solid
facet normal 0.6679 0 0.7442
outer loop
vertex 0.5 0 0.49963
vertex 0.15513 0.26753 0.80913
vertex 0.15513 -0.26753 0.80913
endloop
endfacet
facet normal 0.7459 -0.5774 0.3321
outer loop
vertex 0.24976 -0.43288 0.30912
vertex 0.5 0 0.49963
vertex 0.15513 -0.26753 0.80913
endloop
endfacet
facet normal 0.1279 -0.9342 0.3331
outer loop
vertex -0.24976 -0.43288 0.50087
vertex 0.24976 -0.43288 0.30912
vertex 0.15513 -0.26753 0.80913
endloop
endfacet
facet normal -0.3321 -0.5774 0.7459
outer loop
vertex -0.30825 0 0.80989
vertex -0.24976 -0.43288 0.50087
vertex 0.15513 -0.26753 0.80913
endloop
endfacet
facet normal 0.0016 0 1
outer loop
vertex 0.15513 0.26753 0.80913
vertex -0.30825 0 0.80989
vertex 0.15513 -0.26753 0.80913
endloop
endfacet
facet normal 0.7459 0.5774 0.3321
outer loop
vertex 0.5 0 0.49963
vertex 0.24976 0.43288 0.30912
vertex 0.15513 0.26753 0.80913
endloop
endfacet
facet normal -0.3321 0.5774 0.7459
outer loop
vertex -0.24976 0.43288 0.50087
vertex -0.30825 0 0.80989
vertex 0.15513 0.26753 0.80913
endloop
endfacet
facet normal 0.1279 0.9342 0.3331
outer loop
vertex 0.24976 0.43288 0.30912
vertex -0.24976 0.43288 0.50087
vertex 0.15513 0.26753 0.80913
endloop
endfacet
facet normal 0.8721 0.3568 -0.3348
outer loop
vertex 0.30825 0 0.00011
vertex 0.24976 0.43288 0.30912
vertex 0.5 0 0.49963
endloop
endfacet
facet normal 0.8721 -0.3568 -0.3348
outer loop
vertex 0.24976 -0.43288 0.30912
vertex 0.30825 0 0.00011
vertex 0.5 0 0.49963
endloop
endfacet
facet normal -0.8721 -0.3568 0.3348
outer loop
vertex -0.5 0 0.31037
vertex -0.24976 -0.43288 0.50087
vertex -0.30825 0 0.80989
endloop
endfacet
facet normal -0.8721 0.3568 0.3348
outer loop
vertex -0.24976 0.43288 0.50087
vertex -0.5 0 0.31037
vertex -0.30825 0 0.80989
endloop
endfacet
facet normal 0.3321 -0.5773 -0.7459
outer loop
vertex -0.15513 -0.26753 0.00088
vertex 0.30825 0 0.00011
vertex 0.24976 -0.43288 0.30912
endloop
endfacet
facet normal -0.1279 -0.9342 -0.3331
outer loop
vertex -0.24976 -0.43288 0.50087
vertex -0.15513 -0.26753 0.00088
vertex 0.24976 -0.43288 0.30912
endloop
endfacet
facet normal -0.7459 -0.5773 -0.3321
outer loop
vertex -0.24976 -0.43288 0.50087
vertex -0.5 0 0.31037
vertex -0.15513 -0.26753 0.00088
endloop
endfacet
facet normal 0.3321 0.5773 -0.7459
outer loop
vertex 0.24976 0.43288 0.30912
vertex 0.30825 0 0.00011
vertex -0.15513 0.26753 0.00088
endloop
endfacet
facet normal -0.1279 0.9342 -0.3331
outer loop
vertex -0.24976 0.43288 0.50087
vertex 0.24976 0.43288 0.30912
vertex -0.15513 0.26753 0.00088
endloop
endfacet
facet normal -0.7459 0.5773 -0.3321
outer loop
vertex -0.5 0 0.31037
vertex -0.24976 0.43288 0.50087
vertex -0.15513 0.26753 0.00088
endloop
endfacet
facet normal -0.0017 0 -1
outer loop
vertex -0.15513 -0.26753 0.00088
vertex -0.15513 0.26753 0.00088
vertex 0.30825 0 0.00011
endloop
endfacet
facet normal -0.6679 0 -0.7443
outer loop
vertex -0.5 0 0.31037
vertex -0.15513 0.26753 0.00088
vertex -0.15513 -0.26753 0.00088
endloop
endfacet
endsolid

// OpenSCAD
// file: maths_geodesic.scad
/*
	License: This code is placed in the public Domain
	Contributed By: Willliam A Adams
	August 2011
*/

// A couple of useful constants
Cpi = 3.14159;
Cphi = 1.61803399;
Cepsilon = 0.00000001;

 
// Function: clean
//
// Parameters:
//	n - A number that might be very close to zero
// Description:  
//	There are times when you want a very small number to 
// 	just be zero, instead of being that very small number.
//	This function will compare the number to an arbitrarily small 
//	number.  If it is smaller than the 'epsilon', then zero will be 
// 	returned.  Otherwise, the original number will be returned.
//

function clean(n) = (n < 0) ? ((n < -Cepsilon) ? n : 0) : 
	(n < Cepsilon) ? 0 : n; 

// Function: safediv
//
// Parameters
//	n - The numerator
//	d - The denominator
//
// Description:
//	Since division by zero is generally not a desirable thing, safediv
//	will return '0' whenever there is a division by zero.  Although this will
//	mask some erroneous division by zero errors, it is often the case
//	that you actually want this behavior.  So, it makes it convenient.
function safediv(n,d) = (d==0) ? 0 : n/d;


//==================================
// Degrees
//==================================

function DEGREES(radians) = (180/Cpi) * radians;

function RADIANS(degrees) = Cpi/180 * degrees;

function deg(deg, min=0, sec=0) = [deg, min, sec];

function deg_to_dec(d) = d[0] + d[1]/60 + d[2]/60/60;


//==================================
//  Spherical coordinates
//==================================

// create an instance of a spherical coordinate
// long - rotation around z -axis
// lat - latitude, starting at 0 == 'north pole'
// rad - distance from center
function sph(long, lat, rad=1) = [long, lat, rad];

// Convert spherical to cartesian
//function sph_to_cart(s) = [
//	clean(s[2]*sin(s[1])*cos(s[0])),  
//	clean(s[2]*sin(s[1])*sin(s[0])),
//	clean(s[2]*cos(s[1]))
//	];

function sph_to_cart(s) = [
	clean(s[2]*sin(s[1])*cos(s[0])),  

	clean(s[2]*sin(s[1])*sin(s[0])),

	clean(s[2]*cos(s[1]))
	];

// Convert from cartesian to spherical
function sph_from_cart(c) = sph(
	atan2(c[1],c[0]), 
	atan2(sqrt(c[0]*c[0]+c[1]*c[1]), c[2]), 
	sqrt(c[0]*c[0]+c[1]*c[1]+c[2]*c[2])
	);

function sphu_from_cart(c, rad=1) = sph(
	atan2(c[1],c[0]), 
	atan2(sqrt(c[0]*c[0]+c[1]*c[1]), c[2]), 
	rad
	);

// compute the chord distance between two points on a sphere
function sph_dist(c1, c2) = sqrt(
	c1[2]*c1[2] + c2[2]*c2[2] - 
	2*c1[2]*c2[2]*
	((cos(c1[1])*cos(c2[1])) + cos(c1[0]-c2[0])*sin(c1[1])*sin(c2[1]))   
	);


//==========================================
//	Geodesic calculations
// 
//  Reference: Geodesic Math and How to Use It
//  By: Hugh Kenner
//  Second Paperback Edition (2003), p.74-75
//  http://www.amazon.com/Geodesic-Math-How-Hugh-Kenner/dp/0520239318
//
//  The book was used for reference, so if you want to check the math, 
//  you can plug in various numbers to various routines and see if you get
//  the same numbers in the book.
//
//  In general, there are enough routines here to implement the various
//  pieces necessary to make geodesic objects.
//==========================================

function poly_sum_interior_angles(sides) = (sides-2)*180;
function poly_single_interior_angle(pq) = poly_sum_interior_angles(pq[0])/pq[0];

// Calculate angular deficiency of each vertex in a platonic solid
// p - sides
// q - number of edges per vertex
function angular_defect(pq) = 360 - (poly_single_interior_angle(pq)*pq[1]);
function plat_deficiency(pq) = DEGREES(2*Cpi - pq[1]*Cpi*(1-2/pq[0]));

function plat_dihedral(pq) = 2 * asin( cos(180/pq[1])/sin(180/pq[0]));


// Given a set of coordinates, return the frequency
// Simply calculated by adding up the values of the coordinates
function geo_freq(xyz) = xyz[0]+xyz[1]+xyz[2];

// Convert between the 2D coordinates of vertices on the face triangle
// to the 3D vertices needed to calculate spherical coordinates
function geo_tri2_tri3(xyf) = [xyf[1], xyf[0]-xyf[1], xyf[2]-xyf[0]];

// Given coordinates for a vertex on the octahedron face
// return the spherical coordinates for the vertex
// class 1, method 1
function octa_class1(c) = sph(
	atan(safediv(c[0], c[1])),
	atan(sqrt(c[0]*c[0]+c[1]*c[1])/c[2]),
	1 
	);

function octa_class2(c) = sph(
	atan(c[0]/c[1]),
	atan( sqrt( 2*(c[0]*c[0]+c[1]*c[1])) /c[2]),
	1 
	);

function icosa_class1(c) = octa_class1(
	[
		c[0]*sin(72),  
		c[1]+c[0]*cos(72),  
		geo_freq(c)/2+c[2]/Cphi
	]);

function icosa_class2(c) = sph(
	atan([c0]/c[1]), 
	atan(sqrt(c[0]*c[0]+c[1]*c[1]))/cos(36)*c[2],
	1
	);
 
function tetra_class1(c) = octa_class1(
	[
		sqrt(3*c[0]),  
		2*c[1]-c[0],  
		(3*c[2]-c[0]-c[1])/sqrt(2)
	]);

function class1_icosa_chord_factor(v1, v2, freq) = sph_dist( 
		icosa_class1(geo_tri2_tri3( [v1[0], v1[1], freq])),
		icosa_class1(geo_tri2_tri3( [v2[0], v2[1], freq]))
	);
// file: platonic.scad
/*
From "Platonic Solids for OpenScad" v0.2
by WilliamAAdams
https://www.thingiverse.com/thing:10725
Licensed Creative Commons Public Domain CC0
*/

include <maths_geodesic.scad>


// Information about platonic solids 
// This information is useful in constructing the various solids
// can be found here: http://en.wikipedia.org/wiki/Platonic_solid
// V - vertices
// E - edges
// F - faces
// number, V, E, F, schlafli symbol, dihedral angle, element, name
//tetrahedron = [1, 4, 6, 4, [3,3], 70.5333, "fire", "tetrahedron"];
//hexahedron = [2, 8, 12, 6, [4,3], 90, "earth", "cube"];
//octahedron = [3, 6, 12, 8, [3,4], 109.467, "air", "air"];
//dodecahedron = [4, 20, 30, 12, [5,3], 116.565, "ether", "universe"];
//icosahedron = [5, 12, 30, 20, [3,5], 138.190, "water", "water"];


//================================================
//	Tetrahedron
//================================================
tetra_cart = [
	[+1, +1, +1],
	[-1, -1, +1],
	[-1, +1, -1],
	[+1, -1, -1]
];

function tetra_unit(rad=1) = [
	sph_to_cart(sphu_from_cart(tetra_cart[0], rad)), 
	sph_to_cart(sphu_from_cart(tetra_cart[1], rad)),
	sph_to_cart(sphu_from_cart(tetra_cart[2], rad)),
	sph_to_cart(sphu_from_cart(tetra_cart[3], rad)),
	];


tetrafaces = [
	[0, 3, 1],
	[0,1,2],
	[2,1,3],
	[0,2,3]
];

function tetrahedron(rad=1) = [tetra_unit(rad), tetrafaces];


//================================================
//	Hexahedron - Cube 
//================================================
// vertices for a unit cube with sides of length 1
hexa_cart = [
	[0.5, 0.5, 0.5], 
	[-0.5, 0.5, 0.5], 
	[-0.5, -0.5, 0.5], 
	[0.5, -0.5, 0.5],
	[0.5, 0.5, -0.5], 
	[-0.5, 0.5, -0.5], 
	[-0.5, -0.5, -0.5], 
	[0.5, -0.5, -0.5],
];

function hexa_unit(rad=1) = [
	sph_to_cart(sphu_from_cart(hexa_cart[0], rad)), 
	sph_to_cart(sphu_from_cart(hexa_cart[1], rad)),
	sph_to_cart(sphu_from_cart(hexa_cart[2], rad)),
	sph_to_cart(sphu_from_cart(hexa_cart[3], rad)),
	sph_to_cart(sphu_from_cart(hexa_cart[4], rad)), 
	sph_to_cart(sphu_from_cart(hexa_cart[5], rad)), 
	sph_to_cart(sphu_from_cart(hexa_cart[6], rad)),
	sph_to_cart(sphu_from_cart(hexa_cart[7], rad)),
	];


// enumerate the faces of a cube
// vertex order is clockwise winding
hexafaces = [
	[0,3,2,1],	// top
	[0,1,5,4],
	[1,2,6,5],
	[2,3,7,6],
	[3,0,4,7],
	[4,5,6,7],	// bottom
];

function hexahedron(rad=1) =[hexa_unit(rad), hexafaces];


//================================================
//	Octahedron 
//================================================

octa_cart = [
	[+1, 0, 0],  // + x axis
	[-1, 0, 0],	// - x axis
	[0, +1, 0],	// + y axis
	[0, -1, 0],	// - y axis
	[0, 0, +1],	// + z axis
	[0, 0, -1] 	// - z axis
];

function octa_unit(rad=1) = [
	sph_to_cart(sphu_from_cart(octa_cart[0], rad)), 
	sph_to_cart(sphu_from_cart(octa_cart[1], rad)),
	sph_to_cart(sphu_from_cart(octa_cart[2], rad)),
	sph_to_cart(sphu_from_cart(octa_cart[3], rad)),
	sph_to_cart(sphu_from_cart(octa_cart[4], rad)), 
	sph_to_cart(sphu_from_cart(octa_cart[5], rad)), 
	];

octafaces = [
	[4,2,0],
	[4,0,3],
	[4,3,1],
	[4,1,2],
	[5,0,2],
	[5,3,0],
	[5,1,3],
	[5,2,1]
	];

function octahedron(rad=1) = [octa_unit(rad), octafaces];

//================================================
//	Dodecahedron
//================================================
// (+-1, +-1, +-1)
// (0, +-1/Cphi, +-Cphi)
// (+-1/Cphi, +-Cphi, 0)
// (+-Cphi, 0, +-1/Cphi)

dodeca_cart = [
	[+1, +1, +1],			// 0, 0
	[+1, -1, +1],			// 0, 1
	[-1, -1, +1],			// 0, 2
	[-1, +1, +1],			// 0, 3

	[+1, +1, -1],			// 1, 4
	[-1, +1, -1],			// 1, 5
	[-1, -1, -1],			// 1, 6
	[+1, -1, -1],			// 1, 7

	[0, +1/Cphi, +Cphi],		// 2, 8
	[0, -1/Cphi, +Cphi],		// 2, 9
	[0, -1/Cphi, -Cphi],		// 2, 10
	[0, +1/Cphi, -Cphi],		// 2, 11

	[-1/Cphi, +Cphi, 0],		// 3, 12
	[+1/Cphi, +Cphi, 0],		// 3, 13
	[+1/Cphi, -Cphi, 0],		// 3, 14
	[-1/Cphi, -Cphi, 0],		// 3, 15

	[-Cphi, 0, +1/Cphi],		// 4, 16
	[+Cphi, 0, +1/Cphi],		// 4, 17
	[+Cphi, 0, -1/Cphi],		// 4, 18
	[-Cphi, 0, -1/Cphi],		// 4, 19
];

function dodeca_unit(rad=1) = [
	sph_to_cart(sphu_from_cart(dodeca_cart[0], rad)), 
	sph_to_cart(sphu_from_cart(dodeca_cart[1], rad)),
	sph_to_cart(sphu_from_cart(dodeca_cart[2], rad)),
	sph_to_cart(sphu_from_cart(dodeca_cart[3], rad)),
	sph_to_cart(sphu_from_cart(dodeca_cart[4], rad)), 
	sph_to_cart(sphu_from_cart(dodeca_cart[5], rad)), 
	sph_to_cart(sphu_from_cart(dodeca_cart[6], rad)),
	sph_to_cart(sphu_from_cart(dodeca_cart[7], rad)),
	sph_to_cart(sphu_from_cart(dodeca_cart[8], rad)),
	sph_to_cart(sphu_from_cart(dodeca_cart[9], rad)), 
	sph_to_cart(sphu_from_cart(dodeca_cart[10], rad)), 
	sph_to_cart(sphu_from_cart(dodeca_cart[11], rad)),
	sph_to_cart(sphu_from_cart(dodeca_cart[12], rad)),
	sph_to_cart(sphu_from_cart(dodeca_cart[13], rad)),
	sph_to_cart(sphu_from_cart(dodeca_cart[14], rad)), 
	sph_to_cart(sphu_from_cart(dodeca_cart[15], rad)), 
	sph_to_cart(sphu_from_cart(dodeca_cart[16], rad)),
	sph_to_cart(sphu_from_cart(dodeca_cart[17], rad)),
	sph_to_cart(sphu_from_cart(dodeca_cart[18], rad)),
	sph_to_cart(sphu_from_cart(dodeca_cart[19], rad)), 
	];



dodecafaces=[ 
	[1,9,8,0,17],
	[9,1,14,15,2],
	[9,2,16,3,8],
	[8,3,12,13,0],
	[0,13,4,18,17],
	[1,17,18,7,14],
	[15,14,7,10,6],
	[2,15,6,19,16],
	[16,19,5,12,3],
	[12,5,11,4,13],
	[18,4,11,10,7],
	[19,6,10,11,5]
	];

function dodecahedron(rad=1) = [dodeca_unit(rad), dodecafaces];

//================================================
//	Icosahedron
//================================================
//
// (0, +-1, +-Cphi)
// (+-Cphi, 0, +-1)
// (+-1, +-Cphi, 0)

icosa_cart = [
	[0, +1, +Cphi],	// 0
	[0, +1, -Cphi],	// 1
	[0, -1, -Cphi],	// 2
	[0, -1, +Cphi],	// 3

	[+Cphi, 0, +1],	// 4
	[+Cphi, 0, -1],	// 5
	[-Cphi, 0, -1],	// 6
	[-Cphi, 0, +1],	// 7

	[+1, +Cphi, 0],	// 8
	[+1, -Cphi, 0],	// 9
	[-1, -Cphi, 0],	// 10
	[-1, +Cphi, 0]	// 11
	];

function icosa_unit(rad=1) = [
	sph_to_cart(sphu_from_cart(icosa_cart[0], rad)), 
	sph_to_cart(sphu_from_cart(icosa_cart[1], rad)),
	sph_to_cart(sphu_from_cart(icosa_cart[2], rad)),
	sph_to_cart(sphu_from_cart(icosa_cart[3], rad)),
	sph_to_cart(sphu_from_cart(icosa_cart[4], rad)), 
	sph_to_cart(sphu_from_cart(icosa_cart[5], rad)), 
	sph_to_cart(sphu_from_cart(icosa_cart[6], rad)),
	sph_to_cart(sphu_from_cart(icosa_cart[7], rad)),
	sph_to_cart(sphu_from_cart(icosa_cart[8], rad)),
	sph_to_cart(sphu_from_cart(icosa_cart[9], rad)), 
	sph_to_cart(sphu_from_cart(icosa_cart[10], rad)), 
	sph_to_cart(sphu_from_cart(icosa_cart[11], rad)),
	];

icosafaces = [ 
	[3,0,4],
	[3,4,9],
	[3,9,10],
	[3,10,7],
	[3,7,0],
	[0,8,4],
	[0,7,11],
	[0,11,8],
	[4,8,5],
	[4,5,9],
	[7,10,6],
	[7,6,11],
	[9,5,2],
	[9,2,10],
	[2,6,10],
	[1,5,8],
	[1,8,11],
	[1,11,6],
	[5,1,2],
	[2,1,6]
	];

function icosahedron(rad=1) = [icosa_unit(rad), icosafaces];

module makeTetrahedron(rad = 1){
    polyhedron(points = tetrahedron(rad)[0], faces = tetrahedron(rad)[1]);
}

module makeHexahedron(rad = 1){
    polyhedron(points = hexahedron(rad)[0], faces = hexahedron(rad)[1]);
}

module makeOctahedron(rad = 1){
    polyhedron(points = octahedron(rad)[0], faces = octahedron(rad)[1]);
}

module makeDodecahedron(rad = 1){
    polyhedron(points = dodecahedron(rad)[0], faces = dodecahedron(rad)[1]);
}

module makeIcosahedron(rad = 1){
    polyhedron(points = icosahedron(rad)[0], faces = icosahedron(rad)[1]);
}

//makeTetrahedron();
//makeHexahedron();
//makeOctahedron();
//makeDodecahedron();
//makeIcosahedron();
// main file
// Translations and rotations to roughly level one face with the ground.
// This part by Slashee the Cow

use <platonic.scad>

// Tetrahedron
//color("SteelBlue") translate([0,0,0.334]) rotate([180,0,0]) rotate([45,35.25,90]) makeTetrahedron();

// Octahedron
//color("DarkMagenta")translate([0,0,0.576]) rotate([45, 35.3, 0]) makeOctahedron();

// Dodecahedron
//color("IndianRed") translate([0,0,.795]) rotate([0, -31.8, 0]) makeDodecahedron();

// Icosahedron
color("SpringGreen") translate([0,0,0.405]) resize([1,0,0], auto=true) rotate([0, 21, 0]) makeIcosahedron();
